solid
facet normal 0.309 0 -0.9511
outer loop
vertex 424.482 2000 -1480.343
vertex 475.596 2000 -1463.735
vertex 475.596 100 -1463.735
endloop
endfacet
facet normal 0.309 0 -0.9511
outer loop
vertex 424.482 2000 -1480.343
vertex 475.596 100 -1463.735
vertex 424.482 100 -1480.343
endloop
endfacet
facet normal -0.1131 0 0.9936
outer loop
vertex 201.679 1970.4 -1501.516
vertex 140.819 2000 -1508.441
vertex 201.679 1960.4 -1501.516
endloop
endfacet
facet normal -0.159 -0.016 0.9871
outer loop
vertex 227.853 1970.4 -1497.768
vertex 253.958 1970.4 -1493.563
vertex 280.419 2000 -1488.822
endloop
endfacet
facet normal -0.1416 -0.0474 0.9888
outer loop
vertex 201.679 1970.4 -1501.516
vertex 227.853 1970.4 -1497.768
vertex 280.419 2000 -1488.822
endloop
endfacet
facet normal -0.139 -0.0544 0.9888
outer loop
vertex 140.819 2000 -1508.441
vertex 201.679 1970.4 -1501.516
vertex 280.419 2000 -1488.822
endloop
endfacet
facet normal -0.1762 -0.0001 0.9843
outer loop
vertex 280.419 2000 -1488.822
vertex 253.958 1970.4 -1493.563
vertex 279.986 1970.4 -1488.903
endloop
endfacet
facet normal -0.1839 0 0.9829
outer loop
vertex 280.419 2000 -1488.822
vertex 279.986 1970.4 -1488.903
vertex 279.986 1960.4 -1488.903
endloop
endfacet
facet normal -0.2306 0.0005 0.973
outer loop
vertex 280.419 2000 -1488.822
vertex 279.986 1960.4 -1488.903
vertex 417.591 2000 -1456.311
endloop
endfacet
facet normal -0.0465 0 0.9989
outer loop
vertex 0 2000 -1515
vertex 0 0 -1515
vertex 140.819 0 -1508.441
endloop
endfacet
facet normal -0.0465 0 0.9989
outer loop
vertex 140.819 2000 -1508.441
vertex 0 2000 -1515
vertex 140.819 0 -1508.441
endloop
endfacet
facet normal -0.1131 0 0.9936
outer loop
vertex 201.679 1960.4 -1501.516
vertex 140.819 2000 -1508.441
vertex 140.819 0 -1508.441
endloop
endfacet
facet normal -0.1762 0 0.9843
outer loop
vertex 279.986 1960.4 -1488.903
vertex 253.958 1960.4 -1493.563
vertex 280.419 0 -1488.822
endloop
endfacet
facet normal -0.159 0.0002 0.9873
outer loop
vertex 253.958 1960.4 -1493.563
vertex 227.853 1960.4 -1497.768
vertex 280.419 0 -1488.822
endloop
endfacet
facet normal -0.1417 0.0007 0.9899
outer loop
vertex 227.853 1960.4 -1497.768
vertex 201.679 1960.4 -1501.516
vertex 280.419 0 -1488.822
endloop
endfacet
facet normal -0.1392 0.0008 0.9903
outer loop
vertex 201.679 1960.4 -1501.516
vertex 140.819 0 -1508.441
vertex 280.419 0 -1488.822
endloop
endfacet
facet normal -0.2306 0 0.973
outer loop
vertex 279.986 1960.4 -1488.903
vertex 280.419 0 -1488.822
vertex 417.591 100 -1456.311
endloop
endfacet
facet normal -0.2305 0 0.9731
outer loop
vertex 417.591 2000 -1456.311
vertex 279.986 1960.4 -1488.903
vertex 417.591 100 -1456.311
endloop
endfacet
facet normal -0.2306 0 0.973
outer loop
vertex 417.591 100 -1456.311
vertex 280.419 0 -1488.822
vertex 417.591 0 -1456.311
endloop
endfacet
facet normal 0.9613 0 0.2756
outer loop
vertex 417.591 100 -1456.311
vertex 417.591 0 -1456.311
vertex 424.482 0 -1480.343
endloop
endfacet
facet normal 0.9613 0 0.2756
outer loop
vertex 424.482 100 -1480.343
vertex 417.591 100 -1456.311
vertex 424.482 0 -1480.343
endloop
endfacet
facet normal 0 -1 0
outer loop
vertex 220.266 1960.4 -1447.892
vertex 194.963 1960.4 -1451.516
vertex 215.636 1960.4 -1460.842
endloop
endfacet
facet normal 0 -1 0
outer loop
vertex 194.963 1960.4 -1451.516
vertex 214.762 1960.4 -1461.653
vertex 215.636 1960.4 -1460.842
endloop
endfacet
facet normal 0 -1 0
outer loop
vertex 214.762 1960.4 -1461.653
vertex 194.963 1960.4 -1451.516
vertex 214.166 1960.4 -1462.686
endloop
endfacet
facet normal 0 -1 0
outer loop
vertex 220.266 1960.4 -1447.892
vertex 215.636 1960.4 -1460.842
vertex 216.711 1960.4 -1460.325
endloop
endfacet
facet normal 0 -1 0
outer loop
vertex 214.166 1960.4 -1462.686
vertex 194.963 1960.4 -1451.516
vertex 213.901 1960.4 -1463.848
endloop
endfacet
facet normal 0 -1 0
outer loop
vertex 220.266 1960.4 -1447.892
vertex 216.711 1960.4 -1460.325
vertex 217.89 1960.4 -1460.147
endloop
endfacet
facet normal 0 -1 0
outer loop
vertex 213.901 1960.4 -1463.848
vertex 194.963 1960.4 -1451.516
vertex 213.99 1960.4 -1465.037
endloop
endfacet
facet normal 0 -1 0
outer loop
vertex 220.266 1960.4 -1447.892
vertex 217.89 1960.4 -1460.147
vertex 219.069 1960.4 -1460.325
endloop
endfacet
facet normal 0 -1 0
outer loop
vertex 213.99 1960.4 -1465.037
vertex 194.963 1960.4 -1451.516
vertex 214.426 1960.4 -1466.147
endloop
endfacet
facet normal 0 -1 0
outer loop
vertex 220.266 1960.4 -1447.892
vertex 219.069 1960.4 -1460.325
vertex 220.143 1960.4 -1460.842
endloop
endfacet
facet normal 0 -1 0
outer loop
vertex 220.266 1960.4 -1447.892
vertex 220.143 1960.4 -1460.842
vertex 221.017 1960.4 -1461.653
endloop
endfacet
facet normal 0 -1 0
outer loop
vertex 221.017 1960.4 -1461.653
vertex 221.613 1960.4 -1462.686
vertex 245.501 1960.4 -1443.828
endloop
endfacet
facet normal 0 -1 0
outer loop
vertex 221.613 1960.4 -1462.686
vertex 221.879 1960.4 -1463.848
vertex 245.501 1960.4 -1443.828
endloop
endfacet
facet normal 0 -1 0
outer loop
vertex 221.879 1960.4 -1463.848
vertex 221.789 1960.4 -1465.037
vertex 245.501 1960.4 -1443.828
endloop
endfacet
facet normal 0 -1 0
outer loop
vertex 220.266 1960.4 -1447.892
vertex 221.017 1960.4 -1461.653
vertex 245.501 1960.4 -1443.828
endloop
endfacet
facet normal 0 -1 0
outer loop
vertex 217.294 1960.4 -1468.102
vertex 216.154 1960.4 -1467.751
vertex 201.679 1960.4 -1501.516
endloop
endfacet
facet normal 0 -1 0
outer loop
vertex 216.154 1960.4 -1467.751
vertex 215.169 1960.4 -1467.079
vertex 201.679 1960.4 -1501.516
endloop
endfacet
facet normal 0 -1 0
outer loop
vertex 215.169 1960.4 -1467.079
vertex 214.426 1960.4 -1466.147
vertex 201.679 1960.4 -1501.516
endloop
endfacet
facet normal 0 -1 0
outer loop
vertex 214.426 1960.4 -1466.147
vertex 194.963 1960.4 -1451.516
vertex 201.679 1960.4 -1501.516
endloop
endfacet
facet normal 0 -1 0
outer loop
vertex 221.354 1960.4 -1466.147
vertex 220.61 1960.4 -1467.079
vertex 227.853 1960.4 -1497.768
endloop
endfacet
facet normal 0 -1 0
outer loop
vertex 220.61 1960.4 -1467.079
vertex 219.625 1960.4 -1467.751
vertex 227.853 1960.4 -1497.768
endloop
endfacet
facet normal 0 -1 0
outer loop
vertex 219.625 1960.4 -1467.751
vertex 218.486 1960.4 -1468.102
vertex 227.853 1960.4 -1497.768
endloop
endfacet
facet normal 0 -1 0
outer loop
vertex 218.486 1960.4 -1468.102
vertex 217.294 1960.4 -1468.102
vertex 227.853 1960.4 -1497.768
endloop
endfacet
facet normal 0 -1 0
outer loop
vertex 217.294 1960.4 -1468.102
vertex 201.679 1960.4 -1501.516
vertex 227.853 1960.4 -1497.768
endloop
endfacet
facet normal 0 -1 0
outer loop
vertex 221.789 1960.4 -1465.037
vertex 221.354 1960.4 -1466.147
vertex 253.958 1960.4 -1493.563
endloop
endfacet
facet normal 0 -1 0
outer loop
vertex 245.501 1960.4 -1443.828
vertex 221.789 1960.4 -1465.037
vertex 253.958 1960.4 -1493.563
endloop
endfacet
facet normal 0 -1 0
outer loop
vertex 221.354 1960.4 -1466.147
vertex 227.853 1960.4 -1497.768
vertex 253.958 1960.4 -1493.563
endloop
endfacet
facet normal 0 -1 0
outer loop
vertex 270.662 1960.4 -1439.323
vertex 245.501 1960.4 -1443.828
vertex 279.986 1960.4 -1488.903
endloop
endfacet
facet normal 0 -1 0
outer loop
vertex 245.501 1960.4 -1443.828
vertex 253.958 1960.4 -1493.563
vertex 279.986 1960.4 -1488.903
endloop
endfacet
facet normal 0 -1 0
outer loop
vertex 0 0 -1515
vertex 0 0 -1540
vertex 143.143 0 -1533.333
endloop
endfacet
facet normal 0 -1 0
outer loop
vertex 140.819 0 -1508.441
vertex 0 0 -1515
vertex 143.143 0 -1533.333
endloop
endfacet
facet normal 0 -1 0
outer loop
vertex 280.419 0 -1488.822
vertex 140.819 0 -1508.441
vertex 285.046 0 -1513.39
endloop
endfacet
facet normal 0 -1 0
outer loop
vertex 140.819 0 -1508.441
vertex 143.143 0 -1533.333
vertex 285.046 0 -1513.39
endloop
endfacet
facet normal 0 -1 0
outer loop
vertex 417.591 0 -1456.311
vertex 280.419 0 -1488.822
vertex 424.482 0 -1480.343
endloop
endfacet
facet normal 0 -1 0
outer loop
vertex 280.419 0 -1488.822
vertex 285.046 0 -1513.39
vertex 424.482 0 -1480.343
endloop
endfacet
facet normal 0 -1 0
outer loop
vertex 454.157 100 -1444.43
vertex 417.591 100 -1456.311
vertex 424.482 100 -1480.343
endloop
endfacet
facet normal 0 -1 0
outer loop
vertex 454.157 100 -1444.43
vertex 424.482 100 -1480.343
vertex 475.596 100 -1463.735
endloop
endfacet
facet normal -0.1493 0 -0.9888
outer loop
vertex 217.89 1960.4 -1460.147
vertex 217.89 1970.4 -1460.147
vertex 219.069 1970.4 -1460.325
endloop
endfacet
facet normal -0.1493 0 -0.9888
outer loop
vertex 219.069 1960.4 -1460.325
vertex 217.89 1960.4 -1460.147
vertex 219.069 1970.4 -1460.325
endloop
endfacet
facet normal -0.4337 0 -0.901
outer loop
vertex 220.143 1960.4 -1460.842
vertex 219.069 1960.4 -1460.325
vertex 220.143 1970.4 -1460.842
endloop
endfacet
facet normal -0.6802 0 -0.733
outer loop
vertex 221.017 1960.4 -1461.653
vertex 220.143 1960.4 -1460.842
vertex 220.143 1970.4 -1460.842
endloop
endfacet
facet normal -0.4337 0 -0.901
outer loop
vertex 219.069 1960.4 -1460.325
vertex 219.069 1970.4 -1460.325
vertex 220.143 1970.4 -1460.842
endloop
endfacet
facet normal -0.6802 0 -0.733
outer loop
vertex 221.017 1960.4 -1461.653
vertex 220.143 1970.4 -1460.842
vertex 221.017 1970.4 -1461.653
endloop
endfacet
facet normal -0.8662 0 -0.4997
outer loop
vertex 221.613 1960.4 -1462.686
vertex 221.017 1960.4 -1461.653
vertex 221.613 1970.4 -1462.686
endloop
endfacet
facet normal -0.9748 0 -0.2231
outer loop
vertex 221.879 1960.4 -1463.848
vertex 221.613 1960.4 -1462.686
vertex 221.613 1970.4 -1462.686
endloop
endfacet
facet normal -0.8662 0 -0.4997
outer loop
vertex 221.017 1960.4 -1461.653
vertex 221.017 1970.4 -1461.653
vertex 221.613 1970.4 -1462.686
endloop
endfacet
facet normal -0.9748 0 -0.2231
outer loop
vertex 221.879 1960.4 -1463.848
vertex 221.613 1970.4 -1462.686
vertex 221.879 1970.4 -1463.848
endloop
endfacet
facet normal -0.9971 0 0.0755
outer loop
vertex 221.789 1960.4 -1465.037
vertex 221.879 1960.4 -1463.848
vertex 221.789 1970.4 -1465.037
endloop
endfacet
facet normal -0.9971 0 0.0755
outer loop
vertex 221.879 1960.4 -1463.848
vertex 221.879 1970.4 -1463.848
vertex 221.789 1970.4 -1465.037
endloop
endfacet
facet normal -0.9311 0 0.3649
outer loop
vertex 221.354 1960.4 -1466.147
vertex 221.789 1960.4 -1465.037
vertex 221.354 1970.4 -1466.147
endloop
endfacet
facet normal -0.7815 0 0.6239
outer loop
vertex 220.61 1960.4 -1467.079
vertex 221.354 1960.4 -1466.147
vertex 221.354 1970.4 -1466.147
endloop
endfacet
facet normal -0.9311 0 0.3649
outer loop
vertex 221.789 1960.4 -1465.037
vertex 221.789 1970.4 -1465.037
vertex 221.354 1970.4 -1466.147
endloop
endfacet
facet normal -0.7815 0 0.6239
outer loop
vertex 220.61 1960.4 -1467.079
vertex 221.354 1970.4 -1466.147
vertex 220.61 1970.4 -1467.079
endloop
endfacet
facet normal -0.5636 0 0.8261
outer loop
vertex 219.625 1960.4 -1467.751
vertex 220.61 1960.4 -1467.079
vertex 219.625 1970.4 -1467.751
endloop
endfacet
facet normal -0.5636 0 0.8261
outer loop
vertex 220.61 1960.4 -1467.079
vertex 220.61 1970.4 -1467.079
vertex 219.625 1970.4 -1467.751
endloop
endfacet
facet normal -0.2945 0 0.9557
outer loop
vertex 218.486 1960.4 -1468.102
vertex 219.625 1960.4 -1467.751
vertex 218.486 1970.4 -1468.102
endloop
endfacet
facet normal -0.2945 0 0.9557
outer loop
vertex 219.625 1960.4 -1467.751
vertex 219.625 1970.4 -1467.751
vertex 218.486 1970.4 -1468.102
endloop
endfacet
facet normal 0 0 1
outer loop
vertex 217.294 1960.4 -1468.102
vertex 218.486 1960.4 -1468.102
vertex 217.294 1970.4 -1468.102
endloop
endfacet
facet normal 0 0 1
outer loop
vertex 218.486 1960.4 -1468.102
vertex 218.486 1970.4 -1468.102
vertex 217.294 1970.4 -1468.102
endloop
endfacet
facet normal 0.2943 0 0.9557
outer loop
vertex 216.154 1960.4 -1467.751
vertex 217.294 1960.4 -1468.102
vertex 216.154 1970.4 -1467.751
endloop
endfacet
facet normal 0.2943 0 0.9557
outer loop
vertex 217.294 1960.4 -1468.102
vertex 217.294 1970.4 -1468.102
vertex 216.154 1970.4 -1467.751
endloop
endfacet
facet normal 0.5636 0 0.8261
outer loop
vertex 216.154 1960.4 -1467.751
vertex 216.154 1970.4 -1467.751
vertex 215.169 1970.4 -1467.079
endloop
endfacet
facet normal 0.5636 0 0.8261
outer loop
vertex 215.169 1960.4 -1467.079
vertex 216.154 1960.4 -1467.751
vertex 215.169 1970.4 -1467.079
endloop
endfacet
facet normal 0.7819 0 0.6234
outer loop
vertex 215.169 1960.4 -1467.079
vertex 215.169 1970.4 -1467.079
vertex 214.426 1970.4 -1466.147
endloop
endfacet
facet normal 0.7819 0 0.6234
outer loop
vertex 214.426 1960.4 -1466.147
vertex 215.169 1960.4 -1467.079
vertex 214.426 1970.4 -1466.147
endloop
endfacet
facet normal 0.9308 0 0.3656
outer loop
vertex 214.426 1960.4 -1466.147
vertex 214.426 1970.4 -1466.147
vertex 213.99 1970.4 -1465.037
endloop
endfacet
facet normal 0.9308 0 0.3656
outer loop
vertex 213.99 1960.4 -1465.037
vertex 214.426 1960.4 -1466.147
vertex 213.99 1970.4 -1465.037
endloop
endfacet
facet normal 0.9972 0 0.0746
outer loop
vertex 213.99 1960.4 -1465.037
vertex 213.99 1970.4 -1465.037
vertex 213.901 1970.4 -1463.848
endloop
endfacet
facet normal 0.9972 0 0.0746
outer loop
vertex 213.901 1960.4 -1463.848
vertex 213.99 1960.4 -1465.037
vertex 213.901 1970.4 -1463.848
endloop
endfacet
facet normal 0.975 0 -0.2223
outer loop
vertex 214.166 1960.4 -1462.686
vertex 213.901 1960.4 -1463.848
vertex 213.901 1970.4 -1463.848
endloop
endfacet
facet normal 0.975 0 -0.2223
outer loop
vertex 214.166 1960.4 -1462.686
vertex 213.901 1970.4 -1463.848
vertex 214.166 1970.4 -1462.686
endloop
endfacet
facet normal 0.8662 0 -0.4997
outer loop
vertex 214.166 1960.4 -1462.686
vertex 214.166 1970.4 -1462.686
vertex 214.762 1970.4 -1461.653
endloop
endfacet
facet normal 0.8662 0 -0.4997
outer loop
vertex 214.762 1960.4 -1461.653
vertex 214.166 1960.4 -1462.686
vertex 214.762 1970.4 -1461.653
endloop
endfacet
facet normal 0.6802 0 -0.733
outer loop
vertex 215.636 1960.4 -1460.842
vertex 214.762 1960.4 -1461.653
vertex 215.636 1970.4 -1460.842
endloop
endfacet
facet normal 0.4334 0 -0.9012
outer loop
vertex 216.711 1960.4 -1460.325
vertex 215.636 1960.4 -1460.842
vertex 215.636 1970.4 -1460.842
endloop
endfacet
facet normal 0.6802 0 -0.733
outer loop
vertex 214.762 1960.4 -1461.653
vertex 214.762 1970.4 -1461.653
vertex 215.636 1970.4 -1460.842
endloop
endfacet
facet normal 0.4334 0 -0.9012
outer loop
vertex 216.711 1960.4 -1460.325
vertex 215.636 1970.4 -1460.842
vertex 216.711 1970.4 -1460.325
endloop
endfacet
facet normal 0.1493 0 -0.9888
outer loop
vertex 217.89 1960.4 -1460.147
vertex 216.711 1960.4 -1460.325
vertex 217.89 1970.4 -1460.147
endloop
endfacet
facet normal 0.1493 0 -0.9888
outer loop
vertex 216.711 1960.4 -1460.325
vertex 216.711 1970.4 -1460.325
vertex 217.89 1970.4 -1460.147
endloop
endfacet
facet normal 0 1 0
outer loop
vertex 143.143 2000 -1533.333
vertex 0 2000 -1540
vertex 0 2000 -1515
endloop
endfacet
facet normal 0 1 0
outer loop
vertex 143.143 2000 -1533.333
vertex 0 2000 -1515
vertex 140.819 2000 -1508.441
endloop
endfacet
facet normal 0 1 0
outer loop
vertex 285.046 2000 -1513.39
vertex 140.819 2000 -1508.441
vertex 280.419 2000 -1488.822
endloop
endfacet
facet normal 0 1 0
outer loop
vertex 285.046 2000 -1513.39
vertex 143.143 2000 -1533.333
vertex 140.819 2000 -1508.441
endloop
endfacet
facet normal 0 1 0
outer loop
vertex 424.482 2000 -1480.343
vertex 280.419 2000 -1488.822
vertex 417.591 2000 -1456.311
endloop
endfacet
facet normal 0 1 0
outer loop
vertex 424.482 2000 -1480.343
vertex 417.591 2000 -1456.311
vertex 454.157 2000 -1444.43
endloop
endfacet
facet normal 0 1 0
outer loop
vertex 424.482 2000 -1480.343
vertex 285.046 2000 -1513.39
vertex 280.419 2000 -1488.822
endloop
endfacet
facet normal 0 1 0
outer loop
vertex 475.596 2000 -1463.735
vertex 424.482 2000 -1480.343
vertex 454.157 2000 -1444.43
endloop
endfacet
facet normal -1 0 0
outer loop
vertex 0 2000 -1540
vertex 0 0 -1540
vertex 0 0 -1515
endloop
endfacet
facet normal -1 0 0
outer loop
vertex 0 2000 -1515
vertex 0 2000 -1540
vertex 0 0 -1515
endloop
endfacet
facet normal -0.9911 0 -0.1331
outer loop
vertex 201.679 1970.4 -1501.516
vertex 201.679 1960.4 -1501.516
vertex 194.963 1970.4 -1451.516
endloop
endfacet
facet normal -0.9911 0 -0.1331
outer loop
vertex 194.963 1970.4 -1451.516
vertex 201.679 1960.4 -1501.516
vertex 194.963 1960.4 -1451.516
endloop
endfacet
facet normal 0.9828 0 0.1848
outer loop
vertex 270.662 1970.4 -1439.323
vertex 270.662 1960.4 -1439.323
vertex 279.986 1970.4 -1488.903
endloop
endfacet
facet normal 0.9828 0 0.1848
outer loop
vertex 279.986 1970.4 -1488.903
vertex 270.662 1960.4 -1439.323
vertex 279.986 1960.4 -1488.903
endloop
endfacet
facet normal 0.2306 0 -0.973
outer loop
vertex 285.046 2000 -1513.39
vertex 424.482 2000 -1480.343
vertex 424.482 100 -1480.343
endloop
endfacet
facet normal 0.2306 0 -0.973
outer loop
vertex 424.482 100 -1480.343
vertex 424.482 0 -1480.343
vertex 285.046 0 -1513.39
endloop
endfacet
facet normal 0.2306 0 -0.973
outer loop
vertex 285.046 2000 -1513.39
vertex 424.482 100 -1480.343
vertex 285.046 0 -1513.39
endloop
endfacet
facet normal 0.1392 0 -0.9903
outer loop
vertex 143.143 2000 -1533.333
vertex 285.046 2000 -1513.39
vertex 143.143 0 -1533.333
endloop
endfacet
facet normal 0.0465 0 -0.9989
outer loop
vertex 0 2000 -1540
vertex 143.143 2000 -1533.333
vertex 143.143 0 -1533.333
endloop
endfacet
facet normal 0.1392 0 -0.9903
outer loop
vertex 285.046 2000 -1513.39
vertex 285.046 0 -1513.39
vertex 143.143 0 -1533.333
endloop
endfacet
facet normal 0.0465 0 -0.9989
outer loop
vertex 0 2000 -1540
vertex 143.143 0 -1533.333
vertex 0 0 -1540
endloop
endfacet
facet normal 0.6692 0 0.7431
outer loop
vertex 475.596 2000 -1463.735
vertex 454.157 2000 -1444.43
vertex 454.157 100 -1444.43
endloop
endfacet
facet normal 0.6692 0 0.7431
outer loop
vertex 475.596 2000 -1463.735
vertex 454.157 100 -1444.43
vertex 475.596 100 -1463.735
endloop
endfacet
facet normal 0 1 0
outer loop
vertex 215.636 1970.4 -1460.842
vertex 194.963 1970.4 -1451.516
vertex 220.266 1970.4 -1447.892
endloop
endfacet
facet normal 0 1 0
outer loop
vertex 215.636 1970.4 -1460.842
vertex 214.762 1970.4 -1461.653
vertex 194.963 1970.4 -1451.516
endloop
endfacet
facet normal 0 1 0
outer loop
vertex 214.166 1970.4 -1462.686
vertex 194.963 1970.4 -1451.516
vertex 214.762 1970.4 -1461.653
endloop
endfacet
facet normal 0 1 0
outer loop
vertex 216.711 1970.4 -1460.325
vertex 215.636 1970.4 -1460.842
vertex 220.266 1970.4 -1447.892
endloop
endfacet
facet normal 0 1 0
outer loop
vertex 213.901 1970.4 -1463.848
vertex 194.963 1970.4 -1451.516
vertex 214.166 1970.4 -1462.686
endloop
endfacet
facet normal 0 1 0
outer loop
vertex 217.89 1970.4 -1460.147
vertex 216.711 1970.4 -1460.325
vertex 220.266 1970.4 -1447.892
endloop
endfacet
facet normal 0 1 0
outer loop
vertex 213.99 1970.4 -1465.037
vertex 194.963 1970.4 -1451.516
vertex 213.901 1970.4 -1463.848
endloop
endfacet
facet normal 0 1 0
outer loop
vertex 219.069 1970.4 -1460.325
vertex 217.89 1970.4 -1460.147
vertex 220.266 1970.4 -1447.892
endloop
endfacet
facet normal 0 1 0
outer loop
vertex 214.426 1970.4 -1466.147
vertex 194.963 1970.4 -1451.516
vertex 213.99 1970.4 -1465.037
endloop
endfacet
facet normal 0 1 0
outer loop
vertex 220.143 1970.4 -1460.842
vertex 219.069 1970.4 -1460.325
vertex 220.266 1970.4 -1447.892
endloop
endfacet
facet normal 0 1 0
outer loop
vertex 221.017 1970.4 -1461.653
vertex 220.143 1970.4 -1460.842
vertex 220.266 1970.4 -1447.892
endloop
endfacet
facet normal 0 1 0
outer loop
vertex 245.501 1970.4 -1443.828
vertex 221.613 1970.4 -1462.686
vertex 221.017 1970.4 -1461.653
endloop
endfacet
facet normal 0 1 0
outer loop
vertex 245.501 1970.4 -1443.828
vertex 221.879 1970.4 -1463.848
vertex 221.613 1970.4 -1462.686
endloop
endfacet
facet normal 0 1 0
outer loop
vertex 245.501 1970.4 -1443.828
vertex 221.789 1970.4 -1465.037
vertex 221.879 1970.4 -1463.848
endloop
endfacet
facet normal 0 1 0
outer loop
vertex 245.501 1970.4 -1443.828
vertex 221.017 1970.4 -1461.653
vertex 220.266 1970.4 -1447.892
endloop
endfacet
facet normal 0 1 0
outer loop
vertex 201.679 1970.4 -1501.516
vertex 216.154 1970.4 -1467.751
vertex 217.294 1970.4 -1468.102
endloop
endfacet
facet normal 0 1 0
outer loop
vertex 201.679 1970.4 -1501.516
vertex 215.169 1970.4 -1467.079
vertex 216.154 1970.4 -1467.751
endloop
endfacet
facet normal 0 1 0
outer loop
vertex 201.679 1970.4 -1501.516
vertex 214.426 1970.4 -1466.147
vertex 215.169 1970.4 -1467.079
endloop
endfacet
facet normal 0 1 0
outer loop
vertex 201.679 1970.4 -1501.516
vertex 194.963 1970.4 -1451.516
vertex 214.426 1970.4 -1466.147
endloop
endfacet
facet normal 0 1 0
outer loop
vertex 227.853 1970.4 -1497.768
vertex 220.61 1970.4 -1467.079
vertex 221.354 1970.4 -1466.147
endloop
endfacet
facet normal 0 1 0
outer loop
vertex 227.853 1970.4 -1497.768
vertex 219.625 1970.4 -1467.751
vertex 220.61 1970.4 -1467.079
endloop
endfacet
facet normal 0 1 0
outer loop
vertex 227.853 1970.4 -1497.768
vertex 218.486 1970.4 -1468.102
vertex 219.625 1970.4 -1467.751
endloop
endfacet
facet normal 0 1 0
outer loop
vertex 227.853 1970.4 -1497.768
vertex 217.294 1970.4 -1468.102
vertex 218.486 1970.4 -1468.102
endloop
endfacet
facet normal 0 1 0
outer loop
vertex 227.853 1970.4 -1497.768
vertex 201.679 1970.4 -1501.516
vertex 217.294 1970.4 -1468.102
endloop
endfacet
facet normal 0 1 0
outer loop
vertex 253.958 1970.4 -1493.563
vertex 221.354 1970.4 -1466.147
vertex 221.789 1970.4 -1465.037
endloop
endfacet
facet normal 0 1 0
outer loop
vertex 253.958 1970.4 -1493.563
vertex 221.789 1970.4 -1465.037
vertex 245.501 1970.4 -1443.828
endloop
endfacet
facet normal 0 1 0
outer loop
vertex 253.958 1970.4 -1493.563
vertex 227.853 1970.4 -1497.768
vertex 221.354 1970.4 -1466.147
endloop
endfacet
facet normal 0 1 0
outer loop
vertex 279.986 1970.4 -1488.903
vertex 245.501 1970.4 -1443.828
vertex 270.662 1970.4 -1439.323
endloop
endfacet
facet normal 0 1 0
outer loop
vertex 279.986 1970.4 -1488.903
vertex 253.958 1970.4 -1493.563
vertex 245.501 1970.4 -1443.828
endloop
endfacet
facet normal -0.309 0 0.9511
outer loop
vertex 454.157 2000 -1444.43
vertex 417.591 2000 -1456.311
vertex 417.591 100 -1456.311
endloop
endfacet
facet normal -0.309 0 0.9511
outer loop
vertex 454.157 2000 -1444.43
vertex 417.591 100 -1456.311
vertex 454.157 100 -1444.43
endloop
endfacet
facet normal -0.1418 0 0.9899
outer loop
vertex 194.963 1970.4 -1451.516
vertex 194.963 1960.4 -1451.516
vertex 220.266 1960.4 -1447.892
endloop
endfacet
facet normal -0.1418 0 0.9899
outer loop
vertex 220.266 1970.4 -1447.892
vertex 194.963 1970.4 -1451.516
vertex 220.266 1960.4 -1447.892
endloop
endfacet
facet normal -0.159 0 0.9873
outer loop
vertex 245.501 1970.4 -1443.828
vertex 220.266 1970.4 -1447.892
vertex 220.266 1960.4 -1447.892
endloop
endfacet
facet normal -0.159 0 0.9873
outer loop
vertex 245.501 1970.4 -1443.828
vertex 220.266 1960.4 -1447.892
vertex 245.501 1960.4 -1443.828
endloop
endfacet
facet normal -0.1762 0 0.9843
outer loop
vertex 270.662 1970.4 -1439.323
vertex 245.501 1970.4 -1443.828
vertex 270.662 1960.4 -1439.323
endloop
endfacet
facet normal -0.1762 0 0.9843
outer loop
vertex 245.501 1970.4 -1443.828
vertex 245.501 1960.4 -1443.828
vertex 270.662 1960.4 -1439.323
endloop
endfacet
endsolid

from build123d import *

# Parameters (mm, degrees)
EXTRUDE_1_DEPTH     = 2000
EXTRUDE_2_DEPTH     = 1900
EXTRUDE_START       = -10
EXTRUDE_3_DEPTH     = 10
SKETCH_4_R          = 4
CUT_EXTRUDE_1_DEPTH = 10


with BuildPart() as part:
    # 草图1 → 凸台-拉伸1 (new body)
    with BuildSketch(Plane(origin=(0, 0, 0), x_dir=(1, 0, 0), z_dir=(0, 1, 0))):
        with BuildLine():
            Line((0, 1540), (0, 1515))
            ThreePointArc((0, 1515), (210.847247954, 1500.256124143), (417.590594063, 1456.311469347))
            Line((417.590594063, 1456.311469347), (424.481527958, 1480.343011745))
            ThreePointArc((424.481527958, 1480.343011745), (214.326575478, 1525.012825862), (0, 1540))
        make_face()
    extrude(amount=EXTRUDE_1_DEPTH)

    # 草图2 → 凸台-拉伸2 (add)
    with BuildSketch(Plane(origin=(0, 2000, 0), x_dir=(1, 0, 0), z_dir=(0, 1, 0))):
        Polygon((475.59627434, 1463.734823878), (424.481527958, 1480.343011745), (417.590594063, 1456.311469347), (454.15659952, 1444.430453961), align=None)
    extrude(amount=-EXTRUDE_2_DEPTH)

    # 草图3 → 凸台-拉伸3 (add)
    with BuildSketch(Plane(origin=(0, 1970.4, 0), x_dir=(1, 0, 0), z_dir=(0, 1, 0)).offset(EXTRUDE_START)):
        with BuildLine():
            Line((201.678827868, 1501.516117259), (194.962988272, 1451.516117259))
            ThreePointArc((194.962988272, 1451.516117259), (232.892441695, 1445.915182873), (270.662282272, 1439.323290444))
            Line((270.662282272, 1439.323290444), (279.985715854, 1488.903287295))
            ThreePointArc((279.985715854, 1488.903287295), (240.914827355, 1495.722248935), (201.678827868, 1501.516117259))
        make_face()
    extrude(amount=EXTRUDE_3_DEPTH)

    # 草图4 → 切除-拉伸1 (cut)
    with BuildSketch(Plane(origin=(0, 1970.4, 0), x_dir=(1, 0, 0), z_dir=(0, 1, 0))):
        with Locations(Location((217.889718701, 1464.147071856, 0), (0, 0, 270))):
            Circle(SKETCH_4_R)
    extrude(amount=-CUT_EXTRUDE_1_DEPTH, mode=Mode.SUBTRACT)


solid = part.part
